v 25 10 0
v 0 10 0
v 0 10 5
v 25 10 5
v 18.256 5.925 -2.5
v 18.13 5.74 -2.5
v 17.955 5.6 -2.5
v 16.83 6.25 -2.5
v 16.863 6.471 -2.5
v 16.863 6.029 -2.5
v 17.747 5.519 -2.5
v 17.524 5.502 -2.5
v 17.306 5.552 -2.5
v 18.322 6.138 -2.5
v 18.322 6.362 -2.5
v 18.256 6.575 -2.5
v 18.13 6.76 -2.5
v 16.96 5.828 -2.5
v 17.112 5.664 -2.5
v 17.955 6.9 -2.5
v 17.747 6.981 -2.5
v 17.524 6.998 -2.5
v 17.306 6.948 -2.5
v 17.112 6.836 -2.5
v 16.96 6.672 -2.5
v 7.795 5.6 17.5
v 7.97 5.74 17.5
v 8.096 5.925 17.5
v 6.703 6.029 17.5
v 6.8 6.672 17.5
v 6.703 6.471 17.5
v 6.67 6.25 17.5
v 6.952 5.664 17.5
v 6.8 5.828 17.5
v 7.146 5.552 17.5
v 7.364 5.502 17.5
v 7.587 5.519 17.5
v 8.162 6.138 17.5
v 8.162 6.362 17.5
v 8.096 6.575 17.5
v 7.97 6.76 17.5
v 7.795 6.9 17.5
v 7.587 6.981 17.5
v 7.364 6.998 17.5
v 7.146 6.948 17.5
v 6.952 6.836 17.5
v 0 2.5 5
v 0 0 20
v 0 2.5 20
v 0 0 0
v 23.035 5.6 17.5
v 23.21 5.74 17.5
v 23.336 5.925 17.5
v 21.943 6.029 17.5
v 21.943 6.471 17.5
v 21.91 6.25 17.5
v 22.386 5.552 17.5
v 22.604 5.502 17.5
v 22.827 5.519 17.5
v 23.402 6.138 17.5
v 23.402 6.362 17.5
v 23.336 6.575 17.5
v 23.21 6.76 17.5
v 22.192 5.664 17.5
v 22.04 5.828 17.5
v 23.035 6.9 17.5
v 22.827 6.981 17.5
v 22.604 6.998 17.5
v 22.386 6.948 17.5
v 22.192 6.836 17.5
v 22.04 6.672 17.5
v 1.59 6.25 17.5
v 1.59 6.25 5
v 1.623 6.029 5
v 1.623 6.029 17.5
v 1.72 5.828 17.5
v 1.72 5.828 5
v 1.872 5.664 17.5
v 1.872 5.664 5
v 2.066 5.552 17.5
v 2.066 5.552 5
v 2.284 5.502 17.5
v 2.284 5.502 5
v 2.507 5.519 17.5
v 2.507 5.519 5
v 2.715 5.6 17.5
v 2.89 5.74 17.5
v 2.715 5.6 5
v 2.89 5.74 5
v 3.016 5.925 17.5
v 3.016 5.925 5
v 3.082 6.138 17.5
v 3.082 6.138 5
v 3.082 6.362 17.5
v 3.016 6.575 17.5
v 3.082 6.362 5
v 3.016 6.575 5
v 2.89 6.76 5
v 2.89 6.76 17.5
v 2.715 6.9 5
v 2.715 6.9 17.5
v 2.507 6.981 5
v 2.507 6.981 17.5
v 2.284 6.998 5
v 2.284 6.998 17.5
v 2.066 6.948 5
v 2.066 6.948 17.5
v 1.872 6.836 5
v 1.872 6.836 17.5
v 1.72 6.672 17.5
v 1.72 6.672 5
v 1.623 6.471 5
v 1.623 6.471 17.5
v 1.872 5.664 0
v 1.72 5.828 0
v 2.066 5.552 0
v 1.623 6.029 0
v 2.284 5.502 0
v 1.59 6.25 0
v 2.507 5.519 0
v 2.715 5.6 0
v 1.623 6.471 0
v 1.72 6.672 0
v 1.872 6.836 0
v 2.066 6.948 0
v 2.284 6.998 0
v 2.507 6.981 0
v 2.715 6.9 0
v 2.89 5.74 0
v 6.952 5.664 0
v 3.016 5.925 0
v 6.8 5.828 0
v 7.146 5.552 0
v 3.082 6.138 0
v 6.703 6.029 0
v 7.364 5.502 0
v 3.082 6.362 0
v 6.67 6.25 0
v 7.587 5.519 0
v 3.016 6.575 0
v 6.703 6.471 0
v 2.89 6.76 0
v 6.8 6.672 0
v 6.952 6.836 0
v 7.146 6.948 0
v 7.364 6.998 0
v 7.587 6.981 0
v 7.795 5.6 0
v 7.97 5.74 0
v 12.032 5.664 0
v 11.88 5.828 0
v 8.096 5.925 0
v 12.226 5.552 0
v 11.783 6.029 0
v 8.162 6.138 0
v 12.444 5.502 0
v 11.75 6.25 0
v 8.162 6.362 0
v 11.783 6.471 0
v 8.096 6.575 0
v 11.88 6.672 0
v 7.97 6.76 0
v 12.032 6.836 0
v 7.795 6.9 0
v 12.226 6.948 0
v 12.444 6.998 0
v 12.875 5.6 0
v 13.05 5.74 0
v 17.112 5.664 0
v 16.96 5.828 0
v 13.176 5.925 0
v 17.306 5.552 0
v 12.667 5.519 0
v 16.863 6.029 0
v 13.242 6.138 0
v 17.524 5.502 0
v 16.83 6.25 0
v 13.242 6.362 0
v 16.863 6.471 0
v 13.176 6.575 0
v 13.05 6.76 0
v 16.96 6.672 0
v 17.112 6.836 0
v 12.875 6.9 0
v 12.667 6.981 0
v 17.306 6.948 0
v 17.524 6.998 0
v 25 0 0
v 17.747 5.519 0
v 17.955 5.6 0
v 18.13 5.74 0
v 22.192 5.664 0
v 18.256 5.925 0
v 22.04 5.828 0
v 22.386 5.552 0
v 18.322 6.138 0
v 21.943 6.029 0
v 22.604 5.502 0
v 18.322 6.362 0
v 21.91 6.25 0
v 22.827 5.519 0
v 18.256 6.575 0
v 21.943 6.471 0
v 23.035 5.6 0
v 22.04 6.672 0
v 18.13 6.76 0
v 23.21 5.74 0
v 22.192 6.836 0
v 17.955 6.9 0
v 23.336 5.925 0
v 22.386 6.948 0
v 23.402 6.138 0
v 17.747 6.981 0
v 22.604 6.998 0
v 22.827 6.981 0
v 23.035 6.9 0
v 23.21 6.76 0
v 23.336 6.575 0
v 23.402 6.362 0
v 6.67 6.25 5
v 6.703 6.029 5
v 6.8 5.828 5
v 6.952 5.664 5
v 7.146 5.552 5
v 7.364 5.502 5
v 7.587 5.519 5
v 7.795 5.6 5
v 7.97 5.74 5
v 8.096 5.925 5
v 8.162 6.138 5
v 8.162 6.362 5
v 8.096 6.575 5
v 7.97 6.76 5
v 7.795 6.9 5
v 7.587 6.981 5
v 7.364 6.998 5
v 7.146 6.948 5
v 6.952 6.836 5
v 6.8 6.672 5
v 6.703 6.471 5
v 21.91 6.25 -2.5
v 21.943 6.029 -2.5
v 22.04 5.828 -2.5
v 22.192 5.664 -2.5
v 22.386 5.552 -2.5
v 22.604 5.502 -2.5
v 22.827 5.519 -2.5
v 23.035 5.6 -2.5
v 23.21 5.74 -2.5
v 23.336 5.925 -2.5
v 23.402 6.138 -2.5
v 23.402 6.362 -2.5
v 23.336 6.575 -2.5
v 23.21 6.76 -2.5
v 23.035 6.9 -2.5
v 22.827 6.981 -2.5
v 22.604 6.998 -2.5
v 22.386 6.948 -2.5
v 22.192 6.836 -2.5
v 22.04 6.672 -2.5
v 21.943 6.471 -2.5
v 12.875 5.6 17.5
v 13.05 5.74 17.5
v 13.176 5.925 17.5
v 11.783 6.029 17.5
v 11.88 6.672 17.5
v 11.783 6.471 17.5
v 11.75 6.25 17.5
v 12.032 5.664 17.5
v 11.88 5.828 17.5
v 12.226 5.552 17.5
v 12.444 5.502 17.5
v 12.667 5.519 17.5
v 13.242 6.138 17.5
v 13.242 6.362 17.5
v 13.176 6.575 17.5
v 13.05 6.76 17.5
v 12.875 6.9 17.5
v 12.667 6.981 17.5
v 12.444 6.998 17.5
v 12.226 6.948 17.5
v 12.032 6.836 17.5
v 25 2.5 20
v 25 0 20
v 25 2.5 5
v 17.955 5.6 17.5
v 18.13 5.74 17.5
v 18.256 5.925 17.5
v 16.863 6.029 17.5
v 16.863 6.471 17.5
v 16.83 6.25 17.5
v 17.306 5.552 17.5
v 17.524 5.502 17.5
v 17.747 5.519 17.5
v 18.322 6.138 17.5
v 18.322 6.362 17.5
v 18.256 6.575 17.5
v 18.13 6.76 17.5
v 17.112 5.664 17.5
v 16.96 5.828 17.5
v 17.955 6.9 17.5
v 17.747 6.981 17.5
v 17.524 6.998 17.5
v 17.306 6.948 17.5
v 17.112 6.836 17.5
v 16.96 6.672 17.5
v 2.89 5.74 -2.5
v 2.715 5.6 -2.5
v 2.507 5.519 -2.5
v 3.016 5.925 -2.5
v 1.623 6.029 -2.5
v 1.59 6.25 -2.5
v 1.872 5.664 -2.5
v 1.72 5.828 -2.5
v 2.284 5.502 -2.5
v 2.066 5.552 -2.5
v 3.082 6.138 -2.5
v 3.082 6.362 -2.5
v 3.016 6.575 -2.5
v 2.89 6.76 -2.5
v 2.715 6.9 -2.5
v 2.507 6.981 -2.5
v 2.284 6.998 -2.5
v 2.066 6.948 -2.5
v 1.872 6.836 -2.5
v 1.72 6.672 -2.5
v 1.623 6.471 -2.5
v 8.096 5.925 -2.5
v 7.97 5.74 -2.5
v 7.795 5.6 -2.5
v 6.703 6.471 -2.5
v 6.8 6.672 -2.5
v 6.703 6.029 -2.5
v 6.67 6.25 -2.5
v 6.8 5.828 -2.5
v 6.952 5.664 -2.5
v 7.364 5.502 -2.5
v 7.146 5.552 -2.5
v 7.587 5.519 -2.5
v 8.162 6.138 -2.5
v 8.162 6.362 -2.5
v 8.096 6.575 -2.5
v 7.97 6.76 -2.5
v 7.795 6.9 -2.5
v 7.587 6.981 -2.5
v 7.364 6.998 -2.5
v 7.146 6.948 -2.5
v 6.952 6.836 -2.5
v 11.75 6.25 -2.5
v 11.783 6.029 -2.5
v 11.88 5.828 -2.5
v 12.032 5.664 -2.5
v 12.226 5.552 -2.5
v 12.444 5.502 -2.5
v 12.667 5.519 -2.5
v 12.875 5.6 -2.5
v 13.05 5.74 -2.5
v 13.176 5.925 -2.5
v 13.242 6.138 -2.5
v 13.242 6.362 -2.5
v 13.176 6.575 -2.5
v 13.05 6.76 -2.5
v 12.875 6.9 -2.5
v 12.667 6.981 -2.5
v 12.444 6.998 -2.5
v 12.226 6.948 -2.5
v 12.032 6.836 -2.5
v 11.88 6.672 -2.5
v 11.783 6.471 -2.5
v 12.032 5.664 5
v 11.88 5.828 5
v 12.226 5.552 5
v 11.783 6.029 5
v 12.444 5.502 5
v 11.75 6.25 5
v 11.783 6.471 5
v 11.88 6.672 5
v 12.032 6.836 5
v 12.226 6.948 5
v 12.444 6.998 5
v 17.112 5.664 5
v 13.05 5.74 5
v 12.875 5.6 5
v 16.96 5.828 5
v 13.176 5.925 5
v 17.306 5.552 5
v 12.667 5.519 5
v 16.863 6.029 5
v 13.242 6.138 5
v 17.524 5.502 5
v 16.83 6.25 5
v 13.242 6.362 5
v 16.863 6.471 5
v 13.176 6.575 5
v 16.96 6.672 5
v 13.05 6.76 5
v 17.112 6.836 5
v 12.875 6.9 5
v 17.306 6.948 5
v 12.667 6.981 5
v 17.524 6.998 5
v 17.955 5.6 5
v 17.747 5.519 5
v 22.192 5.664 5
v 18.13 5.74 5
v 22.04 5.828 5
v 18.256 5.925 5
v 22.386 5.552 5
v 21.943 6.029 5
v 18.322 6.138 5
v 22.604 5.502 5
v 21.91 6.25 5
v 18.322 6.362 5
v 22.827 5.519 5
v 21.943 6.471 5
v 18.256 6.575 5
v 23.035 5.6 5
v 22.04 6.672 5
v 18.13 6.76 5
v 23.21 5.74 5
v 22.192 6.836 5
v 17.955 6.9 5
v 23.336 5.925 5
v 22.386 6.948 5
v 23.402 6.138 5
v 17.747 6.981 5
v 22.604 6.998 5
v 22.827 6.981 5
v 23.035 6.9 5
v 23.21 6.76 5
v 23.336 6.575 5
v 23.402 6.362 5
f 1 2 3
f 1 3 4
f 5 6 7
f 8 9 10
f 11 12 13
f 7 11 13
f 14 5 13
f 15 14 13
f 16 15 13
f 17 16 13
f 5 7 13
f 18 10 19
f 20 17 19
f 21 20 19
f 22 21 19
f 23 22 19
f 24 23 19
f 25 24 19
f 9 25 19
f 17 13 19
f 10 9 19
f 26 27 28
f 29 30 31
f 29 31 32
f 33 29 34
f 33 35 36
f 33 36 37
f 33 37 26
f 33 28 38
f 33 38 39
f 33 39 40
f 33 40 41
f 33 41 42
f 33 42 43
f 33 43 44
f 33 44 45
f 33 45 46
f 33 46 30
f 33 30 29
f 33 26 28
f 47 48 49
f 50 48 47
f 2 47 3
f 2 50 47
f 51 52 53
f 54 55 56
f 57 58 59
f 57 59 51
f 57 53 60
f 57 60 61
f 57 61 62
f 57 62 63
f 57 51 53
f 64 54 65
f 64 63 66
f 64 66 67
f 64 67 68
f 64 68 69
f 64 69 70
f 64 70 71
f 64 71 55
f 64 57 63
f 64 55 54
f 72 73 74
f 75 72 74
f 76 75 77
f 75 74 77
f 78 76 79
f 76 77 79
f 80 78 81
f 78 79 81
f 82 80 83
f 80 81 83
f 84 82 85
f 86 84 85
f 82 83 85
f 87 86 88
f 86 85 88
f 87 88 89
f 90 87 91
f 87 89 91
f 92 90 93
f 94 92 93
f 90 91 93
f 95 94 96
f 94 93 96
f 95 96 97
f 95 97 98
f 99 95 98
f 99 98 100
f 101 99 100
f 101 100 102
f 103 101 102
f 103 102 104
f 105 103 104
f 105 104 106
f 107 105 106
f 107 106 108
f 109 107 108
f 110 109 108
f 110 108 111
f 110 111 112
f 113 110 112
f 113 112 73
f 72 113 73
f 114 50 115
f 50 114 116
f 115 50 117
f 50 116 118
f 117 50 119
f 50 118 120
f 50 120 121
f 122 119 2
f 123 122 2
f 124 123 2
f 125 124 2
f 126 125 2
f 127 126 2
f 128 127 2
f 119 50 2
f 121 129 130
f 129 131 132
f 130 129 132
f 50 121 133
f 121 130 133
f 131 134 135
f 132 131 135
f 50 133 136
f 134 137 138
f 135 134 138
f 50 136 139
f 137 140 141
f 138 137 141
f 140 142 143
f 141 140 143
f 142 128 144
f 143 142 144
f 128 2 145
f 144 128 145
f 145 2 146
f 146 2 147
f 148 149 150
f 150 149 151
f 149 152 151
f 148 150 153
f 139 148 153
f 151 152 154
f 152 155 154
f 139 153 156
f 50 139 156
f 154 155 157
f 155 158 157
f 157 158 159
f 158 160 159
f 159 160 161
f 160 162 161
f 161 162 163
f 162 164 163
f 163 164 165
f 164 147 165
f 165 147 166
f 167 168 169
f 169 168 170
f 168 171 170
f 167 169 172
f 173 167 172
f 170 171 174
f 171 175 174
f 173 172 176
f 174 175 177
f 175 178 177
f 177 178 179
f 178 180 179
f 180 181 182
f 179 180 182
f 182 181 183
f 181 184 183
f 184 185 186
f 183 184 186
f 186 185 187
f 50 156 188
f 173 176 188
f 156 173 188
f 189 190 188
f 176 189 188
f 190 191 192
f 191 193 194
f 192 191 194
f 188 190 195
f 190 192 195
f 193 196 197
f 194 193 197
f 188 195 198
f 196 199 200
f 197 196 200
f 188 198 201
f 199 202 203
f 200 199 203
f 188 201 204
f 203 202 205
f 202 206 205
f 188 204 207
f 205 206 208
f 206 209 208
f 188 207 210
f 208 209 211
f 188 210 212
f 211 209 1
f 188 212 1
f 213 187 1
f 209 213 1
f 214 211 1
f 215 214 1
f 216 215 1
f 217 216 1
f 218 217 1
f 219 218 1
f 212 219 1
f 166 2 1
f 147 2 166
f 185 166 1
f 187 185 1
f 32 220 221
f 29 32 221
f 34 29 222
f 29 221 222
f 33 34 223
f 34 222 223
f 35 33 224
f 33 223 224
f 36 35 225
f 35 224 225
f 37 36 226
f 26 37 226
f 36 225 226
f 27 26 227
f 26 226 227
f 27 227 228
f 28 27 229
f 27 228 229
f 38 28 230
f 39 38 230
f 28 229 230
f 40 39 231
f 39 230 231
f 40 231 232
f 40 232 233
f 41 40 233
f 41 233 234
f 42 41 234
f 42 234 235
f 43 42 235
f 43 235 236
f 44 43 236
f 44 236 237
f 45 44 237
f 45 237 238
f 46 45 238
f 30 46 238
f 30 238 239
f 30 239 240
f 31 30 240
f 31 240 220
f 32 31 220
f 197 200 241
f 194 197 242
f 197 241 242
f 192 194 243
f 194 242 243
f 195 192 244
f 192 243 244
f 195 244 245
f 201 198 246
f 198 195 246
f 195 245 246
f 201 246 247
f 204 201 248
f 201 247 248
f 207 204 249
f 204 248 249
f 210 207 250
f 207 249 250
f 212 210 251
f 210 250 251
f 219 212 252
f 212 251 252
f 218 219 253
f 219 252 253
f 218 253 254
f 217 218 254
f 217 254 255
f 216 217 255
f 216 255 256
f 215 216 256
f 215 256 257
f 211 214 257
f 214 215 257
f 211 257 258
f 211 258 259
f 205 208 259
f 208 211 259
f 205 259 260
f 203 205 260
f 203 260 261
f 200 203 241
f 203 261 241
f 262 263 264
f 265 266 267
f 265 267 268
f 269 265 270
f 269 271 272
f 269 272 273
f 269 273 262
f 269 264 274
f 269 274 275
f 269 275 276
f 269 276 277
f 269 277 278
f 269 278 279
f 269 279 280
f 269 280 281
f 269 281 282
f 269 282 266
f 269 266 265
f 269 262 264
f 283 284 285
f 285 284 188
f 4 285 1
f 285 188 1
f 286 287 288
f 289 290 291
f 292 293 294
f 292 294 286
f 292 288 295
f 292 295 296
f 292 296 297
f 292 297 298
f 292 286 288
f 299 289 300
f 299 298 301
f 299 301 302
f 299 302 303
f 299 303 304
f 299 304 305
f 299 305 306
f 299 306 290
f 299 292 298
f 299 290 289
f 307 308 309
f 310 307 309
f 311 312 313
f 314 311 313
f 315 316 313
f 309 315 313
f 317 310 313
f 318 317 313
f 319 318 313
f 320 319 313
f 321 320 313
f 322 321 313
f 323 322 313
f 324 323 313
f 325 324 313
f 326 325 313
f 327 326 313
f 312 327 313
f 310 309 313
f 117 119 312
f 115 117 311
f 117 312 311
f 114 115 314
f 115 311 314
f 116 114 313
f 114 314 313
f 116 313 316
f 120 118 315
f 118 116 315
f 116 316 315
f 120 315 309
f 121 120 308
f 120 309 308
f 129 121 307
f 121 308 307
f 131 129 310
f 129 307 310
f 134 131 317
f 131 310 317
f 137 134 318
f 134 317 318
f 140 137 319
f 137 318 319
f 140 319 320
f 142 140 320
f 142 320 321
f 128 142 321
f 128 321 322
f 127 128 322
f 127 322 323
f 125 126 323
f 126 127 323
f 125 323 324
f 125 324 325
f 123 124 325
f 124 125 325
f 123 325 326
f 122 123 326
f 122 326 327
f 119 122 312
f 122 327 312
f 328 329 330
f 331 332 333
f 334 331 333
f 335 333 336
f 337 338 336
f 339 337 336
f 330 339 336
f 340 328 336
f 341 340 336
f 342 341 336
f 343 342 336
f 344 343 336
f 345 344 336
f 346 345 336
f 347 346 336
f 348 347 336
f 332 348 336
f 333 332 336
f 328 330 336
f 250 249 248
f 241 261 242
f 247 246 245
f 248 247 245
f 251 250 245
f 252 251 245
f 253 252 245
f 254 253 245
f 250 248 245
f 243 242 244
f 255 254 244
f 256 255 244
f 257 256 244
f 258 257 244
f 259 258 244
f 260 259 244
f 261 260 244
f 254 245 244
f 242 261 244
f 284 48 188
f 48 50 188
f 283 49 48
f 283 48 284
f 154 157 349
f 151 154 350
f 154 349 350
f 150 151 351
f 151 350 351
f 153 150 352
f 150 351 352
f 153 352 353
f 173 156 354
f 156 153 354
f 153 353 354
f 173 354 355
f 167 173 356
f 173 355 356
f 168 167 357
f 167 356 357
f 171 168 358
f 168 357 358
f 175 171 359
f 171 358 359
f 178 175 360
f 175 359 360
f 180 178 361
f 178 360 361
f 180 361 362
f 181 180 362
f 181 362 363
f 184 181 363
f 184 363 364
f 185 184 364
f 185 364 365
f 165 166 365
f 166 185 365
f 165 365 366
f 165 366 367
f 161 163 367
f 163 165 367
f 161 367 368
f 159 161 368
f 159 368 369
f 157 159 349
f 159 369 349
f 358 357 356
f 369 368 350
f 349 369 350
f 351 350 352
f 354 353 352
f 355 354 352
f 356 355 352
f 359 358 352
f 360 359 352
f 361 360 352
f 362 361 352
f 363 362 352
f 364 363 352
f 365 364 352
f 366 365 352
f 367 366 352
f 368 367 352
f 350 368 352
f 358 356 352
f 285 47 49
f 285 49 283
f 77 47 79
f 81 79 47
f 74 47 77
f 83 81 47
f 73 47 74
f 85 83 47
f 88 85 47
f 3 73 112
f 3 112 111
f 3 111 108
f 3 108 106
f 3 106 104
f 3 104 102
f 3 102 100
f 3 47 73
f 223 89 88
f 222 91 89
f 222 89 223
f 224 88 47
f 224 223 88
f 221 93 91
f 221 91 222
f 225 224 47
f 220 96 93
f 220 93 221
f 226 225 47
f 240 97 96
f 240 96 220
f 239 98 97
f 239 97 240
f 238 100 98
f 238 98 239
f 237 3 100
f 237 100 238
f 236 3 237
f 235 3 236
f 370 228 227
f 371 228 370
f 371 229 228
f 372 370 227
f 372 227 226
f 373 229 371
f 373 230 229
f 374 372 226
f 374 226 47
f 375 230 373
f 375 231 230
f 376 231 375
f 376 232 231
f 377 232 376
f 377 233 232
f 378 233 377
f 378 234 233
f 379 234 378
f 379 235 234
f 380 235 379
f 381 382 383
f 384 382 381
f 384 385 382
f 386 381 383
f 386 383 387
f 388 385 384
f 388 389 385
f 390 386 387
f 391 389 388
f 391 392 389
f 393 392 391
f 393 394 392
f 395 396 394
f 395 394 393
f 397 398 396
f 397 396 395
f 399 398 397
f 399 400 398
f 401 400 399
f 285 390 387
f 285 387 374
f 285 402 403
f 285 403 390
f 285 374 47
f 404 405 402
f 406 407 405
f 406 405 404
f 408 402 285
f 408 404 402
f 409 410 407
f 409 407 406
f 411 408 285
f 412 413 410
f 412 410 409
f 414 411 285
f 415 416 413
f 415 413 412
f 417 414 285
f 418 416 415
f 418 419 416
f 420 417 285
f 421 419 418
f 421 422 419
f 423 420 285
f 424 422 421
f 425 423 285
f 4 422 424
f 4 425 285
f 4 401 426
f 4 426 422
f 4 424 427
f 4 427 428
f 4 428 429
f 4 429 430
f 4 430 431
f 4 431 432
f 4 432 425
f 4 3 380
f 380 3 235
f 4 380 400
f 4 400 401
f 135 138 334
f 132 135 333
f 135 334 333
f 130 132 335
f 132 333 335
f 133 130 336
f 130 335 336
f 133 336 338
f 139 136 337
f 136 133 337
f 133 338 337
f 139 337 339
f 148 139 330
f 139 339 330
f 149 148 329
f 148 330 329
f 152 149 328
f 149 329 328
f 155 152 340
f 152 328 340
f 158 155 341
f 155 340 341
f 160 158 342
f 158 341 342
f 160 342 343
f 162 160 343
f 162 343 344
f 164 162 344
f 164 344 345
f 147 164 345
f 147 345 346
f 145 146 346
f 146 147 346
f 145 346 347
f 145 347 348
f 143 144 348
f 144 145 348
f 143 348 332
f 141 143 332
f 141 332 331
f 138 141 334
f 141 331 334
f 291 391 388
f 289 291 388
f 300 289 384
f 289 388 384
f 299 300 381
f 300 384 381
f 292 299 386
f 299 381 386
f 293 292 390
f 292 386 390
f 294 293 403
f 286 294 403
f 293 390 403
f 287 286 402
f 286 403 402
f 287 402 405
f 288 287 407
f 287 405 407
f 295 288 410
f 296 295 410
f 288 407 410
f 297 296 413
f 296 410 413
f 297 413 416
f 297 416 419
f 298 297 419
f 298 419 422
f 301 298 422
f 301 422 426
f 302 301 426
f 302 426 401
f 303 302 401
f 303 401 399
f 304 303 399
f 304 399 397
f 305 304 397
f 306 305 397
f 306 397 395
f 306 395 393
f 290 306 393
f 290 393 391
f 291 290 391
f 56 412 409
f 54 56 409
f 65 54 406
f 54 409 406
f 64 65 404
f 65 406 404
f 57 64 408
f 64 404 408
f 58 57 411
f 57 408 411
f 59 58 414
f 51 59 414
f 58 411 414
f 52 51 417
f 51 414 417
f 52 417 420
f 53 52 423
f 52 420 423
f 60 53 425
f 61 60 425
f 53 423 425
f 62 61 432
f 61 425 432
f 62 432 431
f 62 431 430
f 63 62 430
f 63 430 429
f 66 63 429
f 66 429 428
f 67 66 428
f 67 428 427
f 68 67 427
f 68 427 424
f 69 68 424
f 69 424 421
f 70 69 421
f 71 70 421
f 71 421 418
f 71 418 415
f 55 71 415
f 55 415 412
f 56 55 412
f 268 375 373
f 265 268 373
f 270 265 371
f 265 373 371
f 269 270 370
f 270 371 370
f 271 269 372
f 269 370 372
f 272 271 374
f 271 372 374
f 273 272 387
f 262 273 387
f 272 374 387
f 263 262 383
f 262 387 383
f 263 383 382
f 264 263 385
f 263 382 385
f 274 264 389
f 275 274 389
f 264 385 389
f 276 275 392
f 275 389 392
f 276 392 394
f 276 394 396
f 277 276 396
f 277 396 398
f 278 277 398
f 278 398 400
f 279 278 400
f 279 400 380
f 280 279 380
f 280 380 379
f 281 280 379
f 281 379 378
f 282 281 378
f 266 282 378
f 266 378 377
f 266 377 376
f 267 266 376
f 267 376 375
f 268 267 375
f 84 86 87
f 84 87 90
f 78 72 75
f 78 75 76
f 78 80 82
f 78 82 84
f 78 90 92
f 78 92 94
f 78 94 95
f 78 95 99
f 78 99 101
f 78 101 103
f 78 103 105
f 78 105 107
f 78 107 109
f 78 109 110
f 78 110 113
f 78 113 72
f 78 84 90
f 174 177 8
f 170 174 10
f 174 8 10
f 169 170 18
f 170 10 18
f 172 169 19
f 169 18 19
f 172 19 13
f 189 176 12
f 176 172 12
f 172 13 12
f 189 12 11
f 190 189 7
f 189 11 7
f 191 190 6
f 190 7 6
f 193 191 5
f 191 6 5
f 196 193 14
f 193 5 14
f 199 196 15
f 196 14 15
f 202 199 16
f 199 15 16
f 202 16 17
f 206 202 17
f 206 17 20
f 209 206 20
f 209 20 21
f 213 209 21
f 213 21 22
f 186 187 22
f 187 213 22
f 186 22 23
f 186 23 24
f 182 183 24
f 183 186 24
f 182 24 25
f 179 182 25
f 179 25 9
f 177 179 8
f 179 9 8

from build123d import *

# Parameters (mm, degrees)
SKETCH_1_W           = 25
SKETCH_1_H           = 10
EXTRUDE_1_DEPTH      = 5
SKETCH_2_W           = 25
SKETCH_2_H           = 2.5
EXTRUDE_2_DEPTH      = 15
EXTRUDE_3_DEPTH      = 12.5
EXTRUDE_3_DEPTH_BACK = 7.5
SKETCH_3_R           = 0.75


with BuildPart() as part:
    # Эскиз1 → Вытянуть1 (new body)
    with BuildSketch(Plane.XY):
        with Locations((12.5, 5)):
            Rectangle(SKETCH_1_W, SKETCH_1_H)
    extrude(amount=EXTRUDE_1_DEPTH)

    # Эскиз2 → Вытянуть2 (add)
    with BuildSketch(Plane.XY.offset(5)):
        with Locations((12.5, 1.25)):
            Rectangle(SKETCH_2_W, SKETCH_2_H)
    extrude(amount=EXTRUDE_2_DEPTH)

    # Эскиз3 → Вытянуть3 (add, two sides: drawn at the far end of the back side and taken through both)
    with BuildSketch(Plane.XY.offset(5).offset(-EXTRUDE_3_DEPTH_BACK)):
        with Locations((17.58, 6.25)):
            Circle(SKETCH_3_R)
        with Locations((22.66, 6.25)):
            Circle(SKETCH_3_R)
        with Locations((2.34, 6.25)):
            Circle(SKETCH_3_R)
        with Locations((7.42, 6.25)):
            Circle(SKETCH_3_R)
        with Locations((12.5, 6.25)):
            Circle(SKETCH_3_R)
    extrude(amount=EXTRUDE_3_DEPTH + EXTRUDE_3_DEPTH_BACK)


solid = part.part
